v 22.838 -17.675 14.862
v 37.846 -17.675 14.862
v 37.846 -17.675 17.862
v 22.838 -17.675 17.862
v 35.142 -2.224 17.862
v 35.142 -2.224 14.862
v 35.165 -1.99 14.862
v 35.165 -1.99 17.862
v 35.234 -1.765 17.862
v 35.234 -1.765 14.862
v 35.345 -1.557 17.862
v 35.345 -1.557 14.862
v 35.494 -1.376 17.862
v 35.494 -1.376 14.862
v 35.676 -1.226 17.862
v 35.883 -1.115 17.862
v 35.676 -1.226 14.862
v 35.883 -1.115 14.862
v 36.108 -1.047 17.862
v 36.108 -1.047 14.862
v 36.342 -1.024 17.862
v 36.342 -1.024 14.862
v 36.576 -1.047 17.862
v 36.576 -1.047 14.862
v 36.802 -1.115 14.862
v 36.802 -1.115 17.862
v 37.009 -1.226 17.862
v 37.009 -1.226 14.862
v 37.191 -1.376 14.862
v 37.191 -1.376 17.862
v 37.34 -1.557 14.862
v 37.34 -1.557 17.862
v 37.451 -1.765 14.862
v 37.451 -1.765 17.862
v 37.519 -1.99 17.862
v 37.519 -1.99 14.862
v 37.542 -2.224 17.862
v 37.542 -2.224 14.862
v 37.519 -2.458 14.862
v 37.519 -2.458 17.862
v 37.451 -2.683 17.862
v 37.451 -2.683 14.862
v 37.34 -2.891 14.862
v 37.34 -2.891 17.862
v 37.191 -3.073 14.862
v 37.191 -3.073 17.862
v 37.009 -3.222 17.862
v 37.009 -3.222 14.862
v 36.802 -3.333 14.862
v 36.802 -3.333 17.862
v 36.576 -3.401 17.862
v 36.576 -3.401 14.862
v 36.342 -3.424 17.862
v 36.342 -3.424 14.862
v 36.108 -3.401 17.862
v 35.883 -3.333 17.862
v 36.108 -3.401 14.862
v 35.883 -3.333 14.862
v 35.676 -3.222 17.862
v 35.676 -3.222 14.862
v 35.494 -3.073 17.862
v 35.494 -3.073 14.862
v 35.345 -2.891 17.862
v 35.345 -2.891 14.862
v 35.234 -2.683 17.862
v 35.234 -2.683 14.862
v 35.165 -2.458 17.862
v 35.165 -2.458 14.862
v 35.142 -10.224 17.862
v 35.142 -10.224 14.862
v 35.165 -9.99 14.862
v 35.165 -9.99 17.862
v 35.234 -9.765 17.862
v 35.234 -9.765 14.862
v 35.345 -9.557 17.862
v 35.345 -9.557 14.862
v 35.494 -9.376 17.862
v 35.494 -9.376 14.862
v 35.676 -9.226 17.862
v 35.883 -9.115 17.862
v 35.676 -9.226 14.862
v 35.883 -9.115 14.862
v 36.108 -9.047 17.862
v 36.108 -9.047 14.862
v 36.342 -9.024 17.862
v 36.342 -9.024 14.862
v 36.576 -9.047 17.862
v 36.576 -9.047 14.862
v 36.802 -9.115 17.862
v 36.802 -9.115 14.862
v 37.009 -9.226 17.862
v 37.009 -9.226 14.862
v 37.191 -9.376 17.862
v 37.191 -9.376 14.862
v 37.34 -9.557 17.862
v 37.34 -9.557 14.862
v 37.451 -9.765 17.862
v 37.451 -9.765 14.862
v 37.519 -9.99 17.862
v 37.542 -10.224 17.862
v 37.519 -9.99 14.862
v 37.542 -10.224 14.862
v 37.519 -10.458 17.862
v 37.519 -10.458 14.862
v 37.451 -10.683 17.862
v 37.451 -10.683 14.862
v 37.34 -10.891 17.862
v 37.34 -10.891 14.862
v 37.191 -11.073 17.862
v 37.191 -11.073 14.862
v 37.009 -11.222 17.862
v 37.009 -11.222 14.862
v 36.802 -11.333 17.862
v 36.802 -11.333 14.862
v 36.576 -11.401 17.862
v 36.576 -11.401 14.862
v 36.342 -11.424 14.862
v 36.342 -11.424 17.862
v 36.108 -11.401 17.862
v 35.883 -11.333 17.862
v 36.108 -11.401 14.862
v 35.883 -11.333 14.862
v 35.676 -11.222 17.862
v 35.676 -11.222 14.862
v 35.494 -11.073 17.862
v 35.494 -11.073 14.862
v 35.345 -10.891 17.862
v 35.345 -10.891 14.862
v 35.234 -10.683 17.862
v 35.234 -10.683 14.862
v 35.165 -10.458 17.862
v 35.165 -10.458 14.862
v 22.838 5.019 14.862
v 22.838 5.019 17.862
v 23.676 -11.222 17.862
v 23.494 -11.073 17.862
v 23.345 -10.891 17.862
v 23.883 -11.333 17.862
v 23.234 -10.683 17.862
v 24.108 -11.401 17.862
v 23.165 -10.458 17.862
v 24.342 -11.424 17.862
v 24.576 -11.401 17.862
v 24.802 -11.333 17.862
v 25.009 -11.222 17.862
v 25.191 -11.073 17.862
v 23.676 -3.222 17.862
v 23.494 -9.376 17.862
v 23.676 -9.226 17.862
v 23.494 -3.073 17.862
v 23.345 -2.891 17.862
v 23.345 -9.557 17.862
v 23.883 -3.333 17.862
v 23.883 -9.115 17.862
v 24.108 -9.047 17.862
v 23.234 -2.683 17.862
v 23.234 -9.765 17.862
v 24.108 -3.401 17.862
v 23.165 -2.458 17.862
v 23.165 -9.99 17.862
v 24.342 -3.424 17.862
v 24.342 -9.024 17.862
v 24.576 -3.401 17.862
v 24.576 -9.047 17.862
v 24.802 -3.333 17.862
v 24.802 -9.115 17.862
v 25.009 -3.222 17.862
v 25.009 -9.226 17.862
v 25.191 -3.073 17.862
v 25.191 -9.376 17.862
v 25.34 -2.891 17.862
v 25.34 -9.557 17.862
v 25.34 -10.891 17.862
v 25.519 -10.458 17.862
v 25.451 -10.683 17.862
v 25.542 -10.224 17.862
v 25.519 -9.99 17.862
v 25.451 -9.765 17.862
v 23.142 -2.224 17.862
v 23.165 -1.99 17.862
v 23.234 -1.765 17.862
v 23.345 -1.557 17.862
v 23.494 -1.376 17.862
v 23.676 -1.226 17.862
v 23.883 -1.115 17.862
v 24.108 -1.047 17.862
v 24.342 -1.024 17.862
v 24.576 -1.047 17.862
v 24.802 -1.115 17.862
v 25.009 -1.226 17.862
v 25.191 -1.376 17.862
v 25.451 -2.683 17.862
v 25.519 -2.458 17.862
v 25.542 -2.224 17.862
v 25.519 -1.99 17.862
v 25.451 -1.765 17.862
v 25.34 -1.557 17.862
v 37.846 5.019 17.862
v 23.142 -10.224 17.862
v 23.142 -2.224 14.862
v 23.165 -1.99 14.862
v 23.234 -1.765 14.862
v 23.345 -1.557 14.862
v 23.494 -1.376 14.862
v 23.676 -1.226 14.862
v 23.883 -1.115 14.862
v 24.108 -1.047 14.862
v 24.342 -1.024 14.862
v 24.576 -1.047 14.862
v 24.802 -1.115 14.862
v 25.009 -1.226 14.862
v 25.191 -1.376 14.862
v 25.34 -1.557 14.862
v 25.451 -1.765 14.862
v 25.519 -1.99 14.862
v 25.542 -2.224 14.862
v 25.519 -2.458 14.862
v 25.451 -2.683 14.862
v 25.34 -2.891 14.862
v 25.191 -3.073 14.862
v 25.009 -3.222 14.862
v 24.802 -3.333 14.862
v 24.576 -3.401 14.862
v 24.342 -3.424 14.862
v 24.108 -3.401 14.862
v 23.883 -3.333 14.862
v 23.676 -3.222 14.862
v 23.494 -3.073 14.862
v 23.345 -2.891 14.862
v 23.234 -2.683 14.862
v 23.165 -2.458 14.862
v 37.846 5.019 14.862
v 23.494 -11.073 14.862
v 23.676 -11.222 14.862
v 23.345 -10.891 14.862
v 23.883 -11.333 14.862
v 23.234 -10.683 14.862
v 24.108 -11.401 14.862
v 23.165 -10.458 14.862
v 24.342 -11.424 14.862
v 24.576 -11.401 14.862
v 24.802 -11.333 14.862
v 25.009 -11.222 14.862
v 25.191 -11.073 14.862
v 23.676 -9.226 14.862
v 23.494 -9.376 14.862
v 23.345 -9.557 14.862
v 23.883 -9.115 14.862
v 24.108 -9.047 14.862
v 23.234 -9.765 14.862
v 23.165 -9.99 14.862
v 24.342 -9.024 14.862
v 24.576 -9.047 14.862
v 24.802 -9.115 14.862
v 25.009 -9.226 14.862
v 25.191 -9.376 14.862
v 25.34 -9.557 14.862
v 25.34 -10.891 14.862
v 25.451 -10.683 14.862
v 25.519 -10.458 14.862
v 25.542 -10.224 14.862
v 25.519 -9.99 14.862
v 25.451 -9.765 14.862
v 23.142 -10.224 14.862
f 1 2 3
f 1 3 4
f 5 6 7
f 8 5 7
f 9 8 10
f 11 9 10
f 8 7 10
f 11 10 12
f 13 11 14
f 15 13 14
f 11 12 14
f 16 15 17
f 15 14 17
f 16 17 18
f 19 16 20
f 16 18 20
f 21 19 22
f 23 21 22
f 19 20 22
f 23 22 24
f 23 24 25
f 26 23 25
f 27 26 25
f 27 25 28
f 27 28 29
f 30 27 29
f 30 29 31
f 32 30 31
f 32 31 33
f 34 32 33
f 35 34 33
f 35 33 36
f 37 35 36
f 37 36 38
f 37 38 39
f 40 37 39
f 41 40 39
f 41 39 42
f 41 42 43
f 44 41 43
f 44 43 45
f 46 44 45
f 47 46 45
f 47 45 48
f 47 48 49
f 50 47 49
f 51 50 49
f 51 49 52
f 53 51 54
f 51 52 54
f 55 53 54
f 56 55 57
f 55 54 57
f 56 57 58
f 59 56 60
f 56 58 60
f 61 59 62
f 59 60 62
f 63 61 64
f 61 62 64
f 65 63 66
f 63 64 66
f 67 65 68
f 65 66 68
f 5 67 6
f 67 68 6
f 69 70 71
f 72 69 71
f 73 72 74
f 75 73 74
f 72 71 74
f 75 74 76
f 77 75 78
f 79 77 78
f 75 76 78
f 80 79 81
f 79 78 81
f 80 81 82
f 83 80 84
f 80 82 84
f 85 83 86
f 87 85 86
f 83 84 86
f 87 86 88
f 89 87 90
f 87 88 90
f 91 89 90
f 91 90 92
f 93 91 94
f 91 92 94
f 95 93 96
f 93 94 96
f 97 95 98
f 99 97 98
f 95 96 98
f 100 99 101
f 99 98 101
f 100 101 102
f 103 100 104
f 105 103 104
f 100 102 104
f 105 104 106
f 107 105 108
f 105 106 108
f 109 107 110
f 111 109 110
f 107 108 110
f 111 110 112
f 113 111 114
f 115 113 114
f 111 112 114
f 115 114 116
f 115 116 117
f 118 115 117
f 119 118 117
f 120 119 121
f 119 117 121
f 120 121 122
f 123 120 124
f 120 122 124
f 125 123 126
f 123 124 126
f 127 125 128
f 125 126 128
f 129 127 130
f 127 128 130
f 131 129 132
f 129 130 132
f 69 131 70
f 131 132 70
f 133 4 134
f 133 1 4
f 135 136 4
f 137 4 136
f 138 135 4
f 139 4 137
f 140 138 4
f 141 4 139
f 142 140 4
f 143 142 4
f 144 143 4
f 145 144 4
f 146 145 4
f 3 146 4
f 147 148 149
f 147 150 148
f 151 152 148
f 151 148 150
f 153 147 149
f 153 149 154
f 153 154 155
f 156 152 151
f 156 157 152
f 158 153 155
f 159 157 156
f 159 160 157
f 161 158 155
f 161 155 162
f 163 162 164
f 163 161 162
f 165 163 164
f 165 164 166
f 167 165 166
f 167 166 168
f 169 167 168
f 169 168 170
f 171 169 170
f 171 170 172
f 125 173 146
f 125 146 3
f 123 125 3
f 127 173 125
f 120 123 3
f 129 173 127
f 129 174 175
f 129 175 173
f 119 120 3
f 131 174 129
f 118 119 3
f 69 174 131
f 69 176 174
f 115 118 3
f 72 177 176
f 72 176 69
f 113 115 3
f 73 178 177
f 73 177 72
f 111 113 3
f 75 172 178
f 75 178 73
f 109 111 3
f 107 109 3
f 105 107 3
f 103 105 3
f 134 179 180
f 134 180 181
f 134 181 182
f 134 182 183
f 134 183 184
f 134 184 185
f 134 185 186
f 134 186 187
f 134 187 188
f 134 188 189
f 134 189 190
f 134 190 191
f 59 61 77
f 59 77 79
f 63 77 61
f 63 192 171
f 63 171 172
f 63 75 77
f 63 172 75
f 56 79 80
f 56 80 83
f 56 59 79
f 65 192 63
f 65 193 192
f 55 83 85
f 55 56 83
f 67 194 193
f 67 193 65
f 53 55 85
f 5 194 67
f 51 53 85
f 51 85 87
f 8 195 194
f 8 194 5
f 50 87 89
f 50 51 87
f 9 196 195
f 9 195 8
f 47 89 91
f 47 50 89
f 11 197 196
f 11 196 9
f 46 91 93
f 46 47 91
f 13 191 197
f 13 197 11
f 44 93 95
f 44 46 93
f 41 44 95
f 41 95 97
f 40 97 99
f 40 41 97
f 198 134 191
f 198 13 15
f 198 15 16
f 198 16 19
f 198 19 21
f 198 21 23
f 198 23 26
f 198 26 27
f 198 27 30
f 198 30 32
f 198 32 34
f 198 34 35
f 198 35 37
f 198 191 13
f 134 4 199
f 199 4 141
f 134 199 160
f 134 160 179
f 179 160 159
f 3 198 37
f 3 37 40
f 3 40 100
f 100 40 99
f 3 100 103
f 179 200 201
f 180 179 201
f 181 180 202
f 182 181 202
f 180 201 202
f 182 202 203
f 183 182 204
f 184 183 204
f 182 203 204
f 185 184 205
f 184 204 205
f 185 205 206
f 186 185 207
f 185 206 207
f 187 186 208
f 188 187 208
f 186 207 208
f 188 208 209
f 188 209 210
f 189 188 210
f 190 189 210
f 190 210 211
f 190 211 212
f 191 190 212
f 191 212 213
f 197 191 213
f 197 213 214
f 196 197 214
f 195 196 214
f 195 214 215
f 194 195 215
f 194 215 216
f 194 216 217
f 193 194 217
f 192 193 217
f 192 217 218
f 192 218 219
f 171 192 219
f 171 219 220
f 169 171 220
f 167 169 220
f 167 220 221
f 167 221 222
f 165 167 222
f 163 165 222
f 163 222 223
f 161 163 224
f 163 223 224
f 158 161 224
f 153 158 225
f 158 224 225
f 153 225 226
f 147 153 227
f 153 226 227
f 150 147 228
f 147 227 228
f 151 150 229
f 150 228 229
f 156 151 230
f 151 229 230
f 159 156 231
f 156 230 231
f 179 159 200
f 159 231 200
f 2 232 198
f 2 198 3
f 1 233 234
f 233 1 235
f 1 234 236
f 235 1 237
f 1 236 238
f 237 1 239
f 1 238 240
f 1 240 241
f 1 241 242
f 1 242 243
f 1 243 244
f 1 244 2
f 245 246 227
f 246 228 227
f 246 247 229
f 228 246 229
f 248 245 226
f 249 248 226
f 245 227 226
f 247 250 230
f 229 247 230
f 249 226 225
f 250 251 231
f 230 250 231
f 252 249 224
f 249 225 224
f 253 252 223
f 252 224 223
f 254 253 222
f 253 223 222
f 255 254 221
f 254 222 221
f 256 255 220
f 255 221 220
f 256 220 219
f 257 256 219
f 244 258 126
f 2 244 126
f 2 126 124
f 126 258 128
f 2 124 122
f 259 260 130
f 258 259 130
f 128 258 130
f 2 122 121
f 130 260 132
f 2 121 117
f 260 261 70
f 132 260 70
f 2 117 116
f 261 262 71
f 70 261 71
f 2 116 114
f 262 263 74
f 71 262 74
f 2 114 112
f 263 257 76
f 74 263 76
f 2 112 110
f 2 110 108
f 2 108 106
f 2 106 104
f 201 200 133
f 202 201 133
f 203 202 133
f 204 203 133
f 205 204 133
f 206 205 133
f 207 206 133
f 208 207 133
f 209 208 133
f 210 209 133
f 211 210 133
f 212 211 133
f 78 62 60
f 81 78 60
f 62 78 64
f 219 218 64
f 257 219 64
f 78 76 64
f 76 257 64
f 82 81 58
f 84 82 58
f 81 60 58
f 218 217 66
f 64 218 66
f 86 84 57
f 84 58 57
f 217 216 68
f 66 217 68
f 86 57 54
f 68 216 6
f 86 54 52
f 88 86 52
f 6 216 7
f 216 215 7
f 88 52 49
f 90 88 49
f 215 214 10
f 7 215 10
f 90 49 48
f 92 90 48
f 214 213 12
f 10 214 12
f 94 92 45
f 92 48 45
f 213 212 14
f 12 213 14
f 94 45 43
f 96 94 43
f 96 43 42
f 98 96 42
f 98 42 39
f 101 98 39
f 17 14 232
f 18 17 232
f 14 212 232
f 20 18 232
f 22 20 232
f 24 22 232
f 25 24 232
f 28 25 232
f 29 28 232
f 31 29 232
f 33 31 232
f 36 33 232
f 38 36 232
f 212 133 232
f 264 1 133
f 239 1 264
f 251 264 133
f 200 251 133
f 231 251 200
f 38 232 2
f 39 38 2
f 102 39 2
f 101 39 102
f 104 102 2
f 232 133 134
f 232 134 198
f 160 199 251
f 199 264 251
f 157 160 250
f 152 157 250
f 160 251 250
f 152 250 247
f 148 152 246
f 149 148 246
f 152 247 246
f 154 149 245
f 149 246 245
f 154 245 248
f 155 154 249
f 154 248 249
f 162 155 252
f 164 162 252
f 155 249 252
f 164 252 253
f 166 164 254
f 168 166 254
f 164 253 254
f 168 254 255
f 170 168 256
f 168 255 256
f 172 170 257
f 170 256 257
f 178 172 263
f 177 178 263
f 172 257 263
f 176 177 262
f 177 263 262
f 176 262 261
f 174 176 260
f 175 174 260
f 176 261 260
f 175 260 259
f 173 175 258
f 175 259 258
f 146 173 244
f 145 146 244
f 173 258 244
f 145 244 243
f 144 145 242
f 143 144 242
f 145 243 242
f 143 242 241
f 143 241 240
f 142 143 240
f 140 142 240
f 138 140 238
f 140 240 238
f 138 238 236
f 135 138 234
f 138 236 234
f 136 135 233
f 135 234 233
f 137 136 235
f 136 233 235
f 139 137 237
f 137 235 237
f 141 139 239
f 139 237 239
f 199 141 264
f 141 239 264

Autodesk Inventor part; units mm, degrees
ref_plane "YZ Plane" through (0, 0, 0) normal (1, 0, 0) x (0, 1, 0)
ref_plane "XZ Plane" through (0, 0, 0) normal (0, 1, 0) x (-1, 0, 0)
ref_plane "XY Plane" through (0, 0, 0) normal (0, 0, 1) x (1, 0, 0)
ref_plane "РабПлоскость1" through (51.8181, -3.2568, 14.8616) normal (0, 0, 1) x (1, 0, 0)
sketch "Эскиз1" plane through (51.8181, -3.2568, 14.8616) normal (0, 0, 1) x (1, 0, 0)
  line L0 (-26.6721, 3.7827) -> (-26.6721, -9.7173)
  line L1 (-30.7721, 8.2755) -> (-13.9721, 8.2755)
  line L2 (-13.9721, 8.2755) -> (-13.9721, -14.4178)
  line L3 (-13.9721, -14.4178) -> (-30.7721, -14.4178)
  line L4 (-30.7721, -14.4178) -> (-30.7721, 8.2755)
  point P0 (-51.8181, 3.2568)
extrude "Выдавливание1" add sketch "Эскиз1" along normal blind 3
sketch "Эскиз2" plane through (51.8181, -3.2568, 14.8616) normal (0, 0, -1) x (-1, 0, 0)
  circle A0 centre (27.4758, 1.0327) radius 1.2
  circle A1 centre (15.4758, 1.0327) radius 1.2
  circle A2 centre (15.4758, -6.9673) radius 1.2
  circle A3 centre (27.4758, -6.9673) radius 1.2
  point P0 (51.8181, 3.2568)
extrude "Выдавливание2" cut sketch "Эскиз2" against normal blind 10
sketch "Эскиз3" plane through (51.8181, -3.2568, 14.8616) normal (0, 0, -1) x (-1, 0, 0)
  line L0 (30.7721, -14.4178) -> (13.9721, -14.4178) projected
  line L1 (13.9721, -14.4178) -> (28.9801, -14.4178)
  line L2 (28.9801, -14.4178) -> (28.9801, 8.2755)
  line L3 (28.9801, 8.2755) -> (13.9721, 8.2755)
  line L4 (13.9721, 8.2755) -> (13.9721, -14.4178)
  line L5 (13.9721, 8.2755) -> (30.7721, 8.2755) projected
  line L6 (30.7721, -14.4178) -> (28.9801, -14.4178)
  line L7 (28.9801, -14.4178) -> (28.9801, 8.2755)
  line L8 (28.9801, 8.2755) -> (30.7721, 8.2755)
  line L9 (30.7721, 8.2755) -> (30.7721, -14.4178)
  point P0 (51.8181, 3.2568)
  point P1 (30.7721, 8.2755)
  point P2 (28.9801, 8.2755)
  dimension "d4" = 15.008
extrude "Выдавливание3" cut sketch "Эскиз3" against normal blind 10 contours L0 L2 L5 L9
properties part number "проставк"
